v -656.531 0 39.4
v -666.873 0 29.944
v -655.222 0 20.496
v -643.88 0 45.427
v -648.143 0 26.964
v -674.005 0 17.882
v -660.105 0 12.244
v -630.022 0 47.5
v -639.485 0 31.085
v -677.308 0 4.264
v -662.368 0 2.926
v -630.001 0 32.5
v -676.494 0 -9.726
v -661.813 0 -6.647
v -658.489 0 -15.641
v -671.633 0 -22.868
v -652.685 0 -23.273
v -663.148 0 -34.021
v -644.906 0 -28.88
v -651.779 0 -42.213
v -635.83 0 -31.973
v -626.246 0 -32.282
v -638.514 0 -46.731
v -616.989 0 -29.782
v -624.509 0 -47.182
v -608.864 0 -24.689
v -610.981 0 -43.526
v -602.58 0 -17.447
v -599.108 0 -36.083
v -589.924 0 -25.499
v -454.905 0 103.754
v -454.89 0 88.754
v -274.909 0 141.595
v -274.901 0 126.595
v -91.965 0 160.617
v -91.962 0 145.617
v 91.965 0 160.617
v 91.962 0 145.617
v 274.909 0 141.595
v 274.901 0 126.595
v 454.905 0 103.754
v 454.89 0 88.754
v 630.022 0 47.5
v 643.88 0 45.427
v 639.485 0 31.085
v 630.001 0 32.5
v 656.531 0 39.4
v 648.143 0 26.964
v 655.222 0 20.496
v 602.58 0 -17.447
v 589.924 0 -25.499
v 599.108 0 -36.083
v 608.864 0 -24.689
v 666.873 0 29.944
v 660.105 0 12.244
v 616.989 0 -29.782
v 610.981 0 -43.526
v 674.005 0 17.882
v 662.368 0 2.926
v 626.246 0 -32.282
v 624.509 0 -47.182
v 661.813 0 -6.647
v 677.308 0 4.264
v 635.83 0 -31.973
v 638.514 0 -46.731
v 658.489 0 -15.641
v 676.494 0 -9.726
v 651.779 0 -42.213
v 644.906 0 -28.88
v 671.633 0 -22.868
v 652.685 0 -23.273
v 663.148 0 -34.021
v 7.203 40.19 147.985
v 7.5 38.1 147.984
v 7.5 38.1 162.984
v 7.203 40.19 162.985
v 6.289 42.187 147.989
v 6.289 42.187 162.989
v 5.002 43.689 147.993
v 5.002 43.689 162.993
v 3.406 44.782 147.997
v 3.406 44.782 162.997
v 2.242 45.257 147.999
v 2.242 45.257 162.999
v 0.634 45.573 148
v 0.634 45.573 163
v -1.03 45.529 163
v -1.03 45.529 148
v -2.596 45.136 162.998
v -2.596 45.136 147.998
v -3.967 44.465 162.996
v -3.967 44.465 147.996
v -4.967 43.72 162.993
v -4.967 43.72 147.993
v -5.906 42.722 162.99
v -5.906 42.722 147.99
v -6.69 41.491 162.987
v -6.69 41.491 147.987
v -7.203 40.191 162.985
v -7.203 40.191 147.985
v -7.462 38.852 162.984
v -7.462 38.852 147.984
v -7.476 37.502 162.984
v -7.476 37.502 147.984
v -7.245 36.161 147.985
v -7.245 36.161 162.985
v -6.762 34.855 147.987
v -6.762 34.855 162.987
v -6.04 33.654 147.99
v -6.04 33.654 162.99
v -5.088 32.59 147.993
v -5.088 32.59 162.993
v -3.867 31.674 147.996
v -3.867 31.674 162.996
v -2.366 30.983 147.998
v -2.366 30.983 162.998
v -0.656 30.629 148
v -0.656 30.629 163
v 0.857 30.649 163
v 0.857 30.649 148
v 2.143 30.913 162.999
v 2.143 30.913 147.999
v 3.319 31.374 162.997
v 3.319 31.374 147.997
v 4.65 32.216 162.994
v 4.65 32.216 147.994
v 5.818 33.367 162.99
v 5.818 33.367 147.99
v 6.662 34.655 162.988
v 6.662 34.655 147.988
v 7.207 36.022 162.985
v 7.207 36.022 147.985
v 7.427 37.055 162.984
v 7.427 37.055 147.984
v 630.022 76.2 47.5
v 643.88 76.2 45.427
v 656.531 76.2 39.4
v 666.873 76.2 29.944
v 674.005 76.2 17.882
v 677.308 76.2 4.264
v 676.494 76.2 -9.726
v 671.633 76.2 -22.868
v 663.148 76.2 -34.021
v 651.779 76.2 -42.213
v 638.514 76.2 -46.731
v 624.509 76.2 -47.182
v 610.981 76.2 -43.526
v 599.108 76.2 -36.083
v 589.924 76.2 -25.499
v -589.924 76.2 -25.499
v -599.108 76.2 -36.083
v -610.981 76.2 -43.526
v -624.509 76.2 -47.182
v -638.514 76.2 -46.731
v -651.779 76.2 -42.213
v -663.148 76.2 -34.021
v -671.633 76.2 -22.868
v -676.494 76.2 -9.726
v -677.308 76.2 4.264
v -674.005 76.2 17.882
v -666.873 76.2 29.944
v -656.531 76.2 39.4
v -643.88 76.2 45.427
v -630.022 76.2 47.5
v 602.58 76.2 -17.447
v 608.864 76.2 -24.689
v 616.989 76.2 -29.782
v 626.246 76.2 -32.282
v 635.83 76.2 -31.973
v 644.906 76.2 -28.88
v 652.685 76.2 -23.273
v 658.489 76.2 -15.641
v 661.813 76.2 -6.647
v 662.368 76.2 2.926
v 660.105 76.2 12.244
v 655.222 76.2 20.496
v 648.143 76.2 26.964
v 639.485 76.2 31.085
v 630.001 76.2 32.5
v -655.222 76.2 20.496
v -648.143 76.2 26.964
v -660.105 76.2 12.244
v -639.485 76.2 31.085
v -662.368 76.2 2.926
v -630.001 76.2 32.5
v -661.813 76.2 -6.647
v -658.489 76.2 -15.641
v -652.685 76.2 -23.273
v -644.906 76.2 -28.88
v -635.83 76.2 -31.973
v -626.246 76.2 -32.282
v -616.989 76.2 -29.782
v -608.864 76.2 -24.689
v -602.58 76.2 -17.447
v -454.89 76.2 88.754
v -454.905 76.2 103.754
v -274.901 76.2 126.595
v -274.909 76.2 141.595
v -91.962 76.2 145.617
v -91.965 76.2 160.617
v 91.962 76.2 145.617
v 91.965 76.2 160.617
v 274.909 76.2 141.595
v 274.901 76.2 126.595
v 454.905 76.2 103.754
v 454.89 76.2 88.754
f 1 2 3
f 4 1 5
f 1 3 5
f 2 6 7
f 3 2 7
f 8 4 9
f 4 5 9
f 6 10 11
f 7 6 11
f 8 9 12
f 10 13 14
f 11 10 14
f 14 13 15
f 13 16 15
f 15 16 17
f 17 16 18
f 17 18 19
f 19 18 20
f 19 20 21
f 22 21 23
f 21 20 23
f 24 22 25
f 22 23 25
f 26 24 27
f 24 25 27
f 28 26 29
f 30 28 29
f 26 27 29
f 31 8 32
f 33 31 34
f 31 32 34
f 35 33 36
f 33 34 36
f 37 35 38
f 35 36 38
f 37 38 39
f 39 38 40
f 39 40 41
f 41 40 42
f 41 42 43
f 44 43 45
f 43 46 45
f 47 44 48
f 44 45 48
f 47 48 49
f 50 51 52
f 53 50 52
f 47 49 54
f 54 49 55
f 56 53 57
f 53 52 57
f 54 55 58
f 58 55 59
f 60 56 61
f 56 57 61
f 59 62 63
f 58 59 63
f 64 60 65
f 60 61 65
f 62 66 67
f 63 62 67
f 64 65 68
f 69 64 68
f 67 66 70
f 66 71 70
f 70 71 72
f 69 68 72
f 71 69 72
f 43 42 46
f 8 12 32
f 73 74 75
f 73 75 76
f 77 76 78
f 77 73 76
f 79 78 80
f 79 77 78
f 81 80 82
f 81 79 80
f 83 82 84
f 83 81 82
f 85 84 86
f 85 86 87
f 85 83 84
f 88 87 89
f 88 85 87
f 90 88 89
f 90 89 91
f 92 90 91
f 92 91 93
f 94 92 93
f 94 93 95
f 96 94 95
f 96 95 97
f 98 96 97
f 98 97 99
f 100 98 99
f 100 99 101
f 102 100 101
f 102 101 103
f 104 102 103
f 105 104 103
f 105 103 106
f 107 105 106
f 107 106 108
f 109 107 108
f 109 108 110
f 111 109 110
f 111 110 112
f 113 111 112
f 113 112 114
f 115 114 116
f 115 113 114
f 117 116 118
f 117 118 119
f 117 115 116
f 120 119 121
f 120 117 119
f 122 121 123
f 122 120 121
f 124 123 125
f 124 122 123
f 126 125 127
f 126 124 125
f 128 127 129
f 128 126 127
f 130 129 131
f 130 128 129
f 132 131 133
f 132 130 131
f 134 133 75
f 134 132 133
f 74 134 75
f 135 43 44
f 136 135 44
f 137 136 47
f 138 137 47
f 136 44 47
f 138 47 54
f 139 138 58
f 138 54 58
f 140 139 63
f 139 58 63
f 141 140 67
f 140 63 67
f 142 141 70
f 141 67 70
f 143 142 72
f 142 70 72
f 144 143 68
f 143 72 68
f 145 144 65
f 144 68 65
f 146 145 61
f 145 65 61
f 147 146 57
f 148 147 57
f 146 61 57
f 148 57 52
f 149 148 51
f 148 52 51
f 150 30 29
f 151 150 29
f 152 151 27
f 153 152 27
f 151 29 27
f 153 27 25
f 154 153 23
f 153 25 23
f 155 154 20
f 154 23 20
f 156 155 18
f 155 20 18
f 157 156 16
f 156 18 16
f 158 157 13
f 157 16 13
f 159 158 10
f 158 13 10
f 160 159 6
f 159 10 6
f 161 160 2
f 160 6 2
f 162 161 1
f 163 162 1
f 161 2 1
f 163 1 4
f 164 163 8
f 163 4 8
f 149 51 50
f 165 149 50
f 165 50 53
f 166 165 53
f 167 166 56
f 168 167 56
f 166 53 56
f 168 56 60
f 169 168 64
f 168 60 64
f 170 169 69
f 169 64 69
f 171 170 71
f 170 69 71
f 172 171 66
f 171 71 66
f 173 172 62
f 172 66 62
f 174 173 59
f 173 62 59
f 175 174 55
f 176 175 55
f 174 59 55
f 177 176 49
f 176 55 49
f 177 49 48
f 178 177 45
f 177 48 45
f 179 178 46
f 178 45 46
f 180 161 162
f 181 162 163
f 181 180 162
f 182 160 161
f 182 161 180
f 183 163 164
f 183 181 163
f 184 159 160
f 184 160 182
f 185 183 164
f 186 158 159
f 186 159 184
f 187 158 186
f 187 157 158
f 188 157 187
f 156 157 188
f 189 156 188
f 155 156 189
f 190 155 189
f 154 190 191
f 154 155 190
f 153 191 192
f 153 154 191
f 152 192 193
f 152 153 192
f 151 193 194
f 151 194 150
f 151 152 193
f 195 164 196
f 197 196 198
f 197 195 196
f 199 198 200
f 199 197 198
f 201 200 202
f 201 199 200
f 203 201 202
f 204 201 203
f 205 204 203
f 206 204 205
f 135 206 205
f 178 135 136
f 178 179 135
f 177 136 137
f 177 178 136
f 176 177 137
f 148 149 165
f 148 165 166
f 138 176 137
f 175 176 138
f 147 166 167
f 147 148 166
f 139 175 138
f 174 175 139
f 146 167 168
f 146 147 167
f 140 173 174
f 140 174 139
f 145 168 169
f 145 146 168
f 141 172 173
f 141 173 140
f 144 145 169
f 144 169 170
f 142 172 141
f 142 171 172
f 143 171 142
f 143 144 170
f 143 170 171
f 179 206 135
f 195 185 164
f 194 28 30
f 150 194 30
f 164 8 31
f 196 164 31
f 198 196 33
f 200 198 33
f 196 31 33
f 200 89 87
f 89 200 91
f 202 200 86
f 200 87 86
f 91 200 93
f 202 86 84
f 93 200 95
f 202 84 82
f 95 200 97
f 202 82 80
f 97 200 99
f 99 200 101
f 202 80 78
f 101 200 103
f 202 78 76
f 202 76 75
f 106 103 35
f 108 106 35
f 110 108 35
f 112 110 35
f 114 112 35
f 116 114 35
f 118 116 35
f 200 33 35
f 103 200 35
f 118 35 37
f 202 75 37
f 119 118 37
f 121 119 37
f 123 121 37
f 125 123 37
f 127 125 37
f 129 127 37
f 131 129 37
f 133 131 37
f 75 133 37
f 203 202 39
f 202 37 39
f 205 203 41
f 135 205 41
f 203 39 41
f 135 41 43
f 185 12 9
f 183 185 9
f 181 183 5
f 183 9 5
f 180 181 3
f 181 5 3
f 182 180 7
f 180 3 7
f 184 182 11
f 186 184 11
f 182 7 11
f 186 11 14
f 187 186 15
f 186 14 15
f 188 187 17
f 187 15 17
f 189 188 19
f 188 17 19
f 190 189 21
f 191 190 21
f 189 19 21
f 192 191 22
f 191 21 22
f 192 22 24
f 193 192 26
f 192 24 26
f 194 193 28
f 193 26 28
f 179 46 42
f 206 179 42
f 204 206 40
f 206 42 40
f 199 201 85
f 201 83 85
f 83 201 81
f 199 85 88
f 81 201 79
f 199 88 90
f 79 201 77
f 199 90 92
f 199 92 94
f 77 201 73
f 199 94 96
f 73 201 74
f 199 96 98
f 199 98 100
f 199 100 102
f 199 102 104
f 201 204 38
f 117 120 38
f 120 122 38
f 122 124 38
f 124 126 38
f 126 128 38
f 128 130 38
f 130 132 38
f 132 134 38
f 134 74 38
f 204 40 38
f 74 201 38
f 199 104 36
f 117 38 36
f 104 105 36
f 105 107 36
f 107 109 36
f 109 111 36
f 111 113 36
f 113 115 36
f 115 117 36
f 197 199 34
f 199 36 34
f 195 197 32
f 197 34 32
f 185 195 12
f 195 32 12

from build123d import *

# Parameters (mm, degrees)
BOSS_EXTRUDE1_DEPTH = 76.2
SKETCH6_R           = 7.5
CUT_EXTRUDE1_DEPTH  = 164


with BuildPart() as part:
    # Sketch1 → Boss-Extrude1 (new body)
    with BuildSketch(Plane(origin=(0, 0, 0), x_dir=(1, 0, 0), z_dir=(0, 1, 0))):
        with BuildLine():
            ThreePointArc((-630.001110861, -32.499999959), (-658.488874236, 15.640781416), (-602.579780619, 17.446534545))
            Line((-602.579780619, 17.446534545), (-589.924302497, 25.498776329))
            ThreePointArc((-589.924302497, 25.498776329), (-671.63274562, 22.868397775), (-630.021699517, -47.499985829))
            ThreePointArc((-630.021699517, -47.499985829), (0, -163), (630.021699517, -47.499985829))
            ThreePointArc((630.021699517, -47.499985829), (671.63274562, 22.868397775), (589.924302497, 25.498776329))
            Line((589.924302497, 25.498776329), (602.579780619, 17.446534545))
            ThreePointArc((602.579780619, 17.446534545), (658.488874236, 15.640781416), (630.001110861, -32.499999959))
            ThreePointArc((630.001110861, -32.499999959), (0, -148), (-630.001110861, -32.499999959))
        make_face()
    extrude(amount=BOSS_EXTRUDE1_DEPTH)

    # Sketch6 → Cut-Extrude1 (cut, through all)
    with BuildSketch(Plane.XY):
        with Locations((0, 38.1)):
            Circle(SKETCH6_R)
    extrude(amount=CUT_EXTRUDE1_DEPTH, mode=Mode.SUBTRACT)


solid = part.part
